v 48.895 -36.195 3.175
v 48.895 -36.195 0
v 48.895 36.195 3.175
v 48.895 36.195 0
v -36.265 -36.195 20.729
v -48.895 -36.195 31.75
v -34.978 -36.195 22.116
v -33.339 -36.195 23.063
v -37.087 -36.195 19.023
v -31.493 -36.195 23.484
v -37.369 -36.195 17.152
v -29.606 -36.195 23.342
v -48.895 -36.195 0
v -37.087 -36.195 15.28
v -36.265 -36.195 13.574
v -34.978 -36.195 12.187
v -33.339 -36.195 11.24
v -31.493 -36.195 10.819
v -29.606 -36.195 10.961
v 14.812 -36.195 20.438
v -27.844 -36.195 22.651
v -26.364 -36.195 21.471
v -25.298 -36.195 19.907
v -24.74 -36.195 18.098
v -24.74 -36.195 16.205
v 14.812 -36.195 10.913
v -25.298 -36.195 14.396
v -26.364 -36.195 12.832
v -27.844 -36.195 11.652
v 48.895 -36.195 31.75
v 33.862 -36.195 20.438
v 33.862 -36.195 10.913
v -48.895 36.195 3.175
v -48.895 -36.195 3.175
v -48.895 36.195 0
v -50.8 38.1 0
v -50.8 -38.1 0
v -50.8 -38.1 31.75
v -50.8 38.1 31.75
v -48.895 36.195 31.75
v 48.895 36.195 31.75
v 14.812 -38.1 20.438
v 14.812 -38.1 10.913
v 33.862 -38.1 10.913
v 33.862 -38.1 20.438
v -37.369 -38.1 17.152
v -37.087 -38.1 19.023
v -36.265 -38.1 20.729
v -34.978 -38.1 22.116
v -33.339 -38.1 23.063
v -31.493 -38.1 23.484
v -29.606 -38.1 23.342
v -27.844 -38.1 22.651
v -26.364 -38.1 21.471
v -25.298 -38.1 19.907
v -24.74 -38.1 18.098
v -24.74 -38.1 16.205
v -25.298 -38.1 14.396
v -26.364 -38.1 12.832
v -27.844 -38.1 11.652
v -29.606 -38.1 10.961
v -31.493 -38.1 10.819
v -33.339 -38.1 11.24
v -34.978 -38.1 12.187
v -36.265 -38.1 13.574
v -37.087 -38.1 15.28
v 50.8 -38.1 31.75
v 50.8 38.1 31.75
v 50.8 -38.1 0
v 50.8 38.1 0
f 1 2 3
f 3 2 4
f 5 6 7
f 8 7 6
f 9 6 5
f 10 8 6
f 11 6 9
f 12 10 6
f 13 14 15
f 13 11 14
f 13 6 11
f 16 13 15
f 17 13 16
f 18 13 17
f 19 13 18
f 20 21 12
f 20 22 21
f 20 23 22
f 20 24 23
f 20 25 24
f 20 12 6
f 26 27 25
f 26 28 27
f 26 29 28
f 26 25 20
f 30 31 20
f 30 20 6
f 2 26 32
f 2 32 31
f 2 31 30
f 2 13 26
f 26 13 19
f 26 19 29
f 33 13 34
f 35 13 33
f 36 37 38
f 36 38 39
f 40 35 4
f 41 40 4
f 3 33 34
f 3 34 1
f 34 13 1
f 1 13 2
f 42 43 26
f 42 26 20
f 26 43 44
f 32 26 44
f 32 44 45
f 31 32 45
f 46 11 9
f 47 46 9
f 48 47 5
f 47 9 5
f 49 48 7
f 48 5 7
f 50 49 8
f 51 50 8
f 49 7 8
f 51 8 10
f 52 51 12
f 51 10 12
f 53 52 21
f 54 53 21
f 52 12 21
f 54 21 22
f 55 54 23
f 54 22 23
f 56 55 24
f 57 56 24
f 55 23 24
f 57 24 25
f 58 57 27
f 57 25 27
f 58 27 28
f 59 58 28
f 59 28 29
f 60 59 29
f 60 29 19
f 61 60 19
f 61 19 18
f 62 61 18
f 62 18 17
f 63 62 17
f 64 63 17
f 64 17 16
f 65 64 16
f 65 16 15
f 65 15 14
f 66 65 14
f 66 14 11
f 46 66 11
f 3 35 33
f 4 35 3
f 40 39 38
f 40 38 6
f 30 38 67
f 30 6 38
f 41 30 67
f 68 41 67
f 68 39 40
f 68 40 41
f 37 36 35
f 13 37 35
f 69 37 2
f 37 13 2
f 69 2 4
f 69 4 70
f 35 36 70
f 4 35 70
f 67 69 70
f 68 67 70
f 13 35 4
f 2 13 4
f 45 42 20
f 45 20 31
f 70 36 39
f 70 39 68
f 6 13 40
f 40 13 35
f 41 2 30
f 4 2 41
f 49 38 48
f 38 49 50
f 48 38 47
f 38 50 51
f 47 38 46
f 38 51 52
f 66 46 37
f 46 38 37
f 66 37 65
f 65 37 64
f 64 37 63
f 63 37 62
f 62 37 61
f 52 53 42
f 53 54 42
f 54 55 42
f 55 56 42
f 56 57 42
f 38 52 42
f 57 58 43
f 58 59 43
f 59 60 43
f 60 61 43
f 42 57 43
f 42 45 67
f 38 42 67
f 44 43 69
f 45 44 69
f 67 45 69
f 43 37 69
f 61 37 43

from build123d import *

# Parameters (mm, degrees)
F0_W     = 101.6
F0_H     = 76.2
F0_W_2   = 97.79
F0_H_2   = 72.39
F1_DEPTH = 31.75
F3_D     = 12.7
F3_DEPTH = 12.7
F4_DEPTH = 3.175
F2_W     = 19.05
F2_H     = 9.525
F5_DEPTH = 1.905


with BuildPart() as f1:
    # F0 (on Top) → F1 (new body)
    with BuildSketch(Plane.XY):
        Rectangle(F0_W, F0_H)
        Rectangle(F0_W_2, F0_H_2, mode=Mode.SUBTRACT)
    extrude(amount=F1_DEPTH)

    # F3
    with Locations(Plane.XZ.offset(38.1)):
        with Locations((-31.0187, 17.151518)):
            Hole(F3_D / 2, depth=F3_DEPTH)

    # F2 (on face) → F5 (cut, through all)
    with BuildSketch(Plane.XZ.offset(38.1)):
        with Locations((24.336567, 15.675096)):
            Rectangle(F2_W, F2_H)
    extrude(amount=-F5_DEPTH, mode=Mode.SUBTRACT)


with BuildPart() as f4:
    # F0 (on Top) → F4 (new body)
    with BuildSketch(Plane.XY):
        Rectangle(F0_W_2, F0_H_2)
    extrude(amount=F4_DEPTH)


solid = Compound([f1.part, f4.part])
